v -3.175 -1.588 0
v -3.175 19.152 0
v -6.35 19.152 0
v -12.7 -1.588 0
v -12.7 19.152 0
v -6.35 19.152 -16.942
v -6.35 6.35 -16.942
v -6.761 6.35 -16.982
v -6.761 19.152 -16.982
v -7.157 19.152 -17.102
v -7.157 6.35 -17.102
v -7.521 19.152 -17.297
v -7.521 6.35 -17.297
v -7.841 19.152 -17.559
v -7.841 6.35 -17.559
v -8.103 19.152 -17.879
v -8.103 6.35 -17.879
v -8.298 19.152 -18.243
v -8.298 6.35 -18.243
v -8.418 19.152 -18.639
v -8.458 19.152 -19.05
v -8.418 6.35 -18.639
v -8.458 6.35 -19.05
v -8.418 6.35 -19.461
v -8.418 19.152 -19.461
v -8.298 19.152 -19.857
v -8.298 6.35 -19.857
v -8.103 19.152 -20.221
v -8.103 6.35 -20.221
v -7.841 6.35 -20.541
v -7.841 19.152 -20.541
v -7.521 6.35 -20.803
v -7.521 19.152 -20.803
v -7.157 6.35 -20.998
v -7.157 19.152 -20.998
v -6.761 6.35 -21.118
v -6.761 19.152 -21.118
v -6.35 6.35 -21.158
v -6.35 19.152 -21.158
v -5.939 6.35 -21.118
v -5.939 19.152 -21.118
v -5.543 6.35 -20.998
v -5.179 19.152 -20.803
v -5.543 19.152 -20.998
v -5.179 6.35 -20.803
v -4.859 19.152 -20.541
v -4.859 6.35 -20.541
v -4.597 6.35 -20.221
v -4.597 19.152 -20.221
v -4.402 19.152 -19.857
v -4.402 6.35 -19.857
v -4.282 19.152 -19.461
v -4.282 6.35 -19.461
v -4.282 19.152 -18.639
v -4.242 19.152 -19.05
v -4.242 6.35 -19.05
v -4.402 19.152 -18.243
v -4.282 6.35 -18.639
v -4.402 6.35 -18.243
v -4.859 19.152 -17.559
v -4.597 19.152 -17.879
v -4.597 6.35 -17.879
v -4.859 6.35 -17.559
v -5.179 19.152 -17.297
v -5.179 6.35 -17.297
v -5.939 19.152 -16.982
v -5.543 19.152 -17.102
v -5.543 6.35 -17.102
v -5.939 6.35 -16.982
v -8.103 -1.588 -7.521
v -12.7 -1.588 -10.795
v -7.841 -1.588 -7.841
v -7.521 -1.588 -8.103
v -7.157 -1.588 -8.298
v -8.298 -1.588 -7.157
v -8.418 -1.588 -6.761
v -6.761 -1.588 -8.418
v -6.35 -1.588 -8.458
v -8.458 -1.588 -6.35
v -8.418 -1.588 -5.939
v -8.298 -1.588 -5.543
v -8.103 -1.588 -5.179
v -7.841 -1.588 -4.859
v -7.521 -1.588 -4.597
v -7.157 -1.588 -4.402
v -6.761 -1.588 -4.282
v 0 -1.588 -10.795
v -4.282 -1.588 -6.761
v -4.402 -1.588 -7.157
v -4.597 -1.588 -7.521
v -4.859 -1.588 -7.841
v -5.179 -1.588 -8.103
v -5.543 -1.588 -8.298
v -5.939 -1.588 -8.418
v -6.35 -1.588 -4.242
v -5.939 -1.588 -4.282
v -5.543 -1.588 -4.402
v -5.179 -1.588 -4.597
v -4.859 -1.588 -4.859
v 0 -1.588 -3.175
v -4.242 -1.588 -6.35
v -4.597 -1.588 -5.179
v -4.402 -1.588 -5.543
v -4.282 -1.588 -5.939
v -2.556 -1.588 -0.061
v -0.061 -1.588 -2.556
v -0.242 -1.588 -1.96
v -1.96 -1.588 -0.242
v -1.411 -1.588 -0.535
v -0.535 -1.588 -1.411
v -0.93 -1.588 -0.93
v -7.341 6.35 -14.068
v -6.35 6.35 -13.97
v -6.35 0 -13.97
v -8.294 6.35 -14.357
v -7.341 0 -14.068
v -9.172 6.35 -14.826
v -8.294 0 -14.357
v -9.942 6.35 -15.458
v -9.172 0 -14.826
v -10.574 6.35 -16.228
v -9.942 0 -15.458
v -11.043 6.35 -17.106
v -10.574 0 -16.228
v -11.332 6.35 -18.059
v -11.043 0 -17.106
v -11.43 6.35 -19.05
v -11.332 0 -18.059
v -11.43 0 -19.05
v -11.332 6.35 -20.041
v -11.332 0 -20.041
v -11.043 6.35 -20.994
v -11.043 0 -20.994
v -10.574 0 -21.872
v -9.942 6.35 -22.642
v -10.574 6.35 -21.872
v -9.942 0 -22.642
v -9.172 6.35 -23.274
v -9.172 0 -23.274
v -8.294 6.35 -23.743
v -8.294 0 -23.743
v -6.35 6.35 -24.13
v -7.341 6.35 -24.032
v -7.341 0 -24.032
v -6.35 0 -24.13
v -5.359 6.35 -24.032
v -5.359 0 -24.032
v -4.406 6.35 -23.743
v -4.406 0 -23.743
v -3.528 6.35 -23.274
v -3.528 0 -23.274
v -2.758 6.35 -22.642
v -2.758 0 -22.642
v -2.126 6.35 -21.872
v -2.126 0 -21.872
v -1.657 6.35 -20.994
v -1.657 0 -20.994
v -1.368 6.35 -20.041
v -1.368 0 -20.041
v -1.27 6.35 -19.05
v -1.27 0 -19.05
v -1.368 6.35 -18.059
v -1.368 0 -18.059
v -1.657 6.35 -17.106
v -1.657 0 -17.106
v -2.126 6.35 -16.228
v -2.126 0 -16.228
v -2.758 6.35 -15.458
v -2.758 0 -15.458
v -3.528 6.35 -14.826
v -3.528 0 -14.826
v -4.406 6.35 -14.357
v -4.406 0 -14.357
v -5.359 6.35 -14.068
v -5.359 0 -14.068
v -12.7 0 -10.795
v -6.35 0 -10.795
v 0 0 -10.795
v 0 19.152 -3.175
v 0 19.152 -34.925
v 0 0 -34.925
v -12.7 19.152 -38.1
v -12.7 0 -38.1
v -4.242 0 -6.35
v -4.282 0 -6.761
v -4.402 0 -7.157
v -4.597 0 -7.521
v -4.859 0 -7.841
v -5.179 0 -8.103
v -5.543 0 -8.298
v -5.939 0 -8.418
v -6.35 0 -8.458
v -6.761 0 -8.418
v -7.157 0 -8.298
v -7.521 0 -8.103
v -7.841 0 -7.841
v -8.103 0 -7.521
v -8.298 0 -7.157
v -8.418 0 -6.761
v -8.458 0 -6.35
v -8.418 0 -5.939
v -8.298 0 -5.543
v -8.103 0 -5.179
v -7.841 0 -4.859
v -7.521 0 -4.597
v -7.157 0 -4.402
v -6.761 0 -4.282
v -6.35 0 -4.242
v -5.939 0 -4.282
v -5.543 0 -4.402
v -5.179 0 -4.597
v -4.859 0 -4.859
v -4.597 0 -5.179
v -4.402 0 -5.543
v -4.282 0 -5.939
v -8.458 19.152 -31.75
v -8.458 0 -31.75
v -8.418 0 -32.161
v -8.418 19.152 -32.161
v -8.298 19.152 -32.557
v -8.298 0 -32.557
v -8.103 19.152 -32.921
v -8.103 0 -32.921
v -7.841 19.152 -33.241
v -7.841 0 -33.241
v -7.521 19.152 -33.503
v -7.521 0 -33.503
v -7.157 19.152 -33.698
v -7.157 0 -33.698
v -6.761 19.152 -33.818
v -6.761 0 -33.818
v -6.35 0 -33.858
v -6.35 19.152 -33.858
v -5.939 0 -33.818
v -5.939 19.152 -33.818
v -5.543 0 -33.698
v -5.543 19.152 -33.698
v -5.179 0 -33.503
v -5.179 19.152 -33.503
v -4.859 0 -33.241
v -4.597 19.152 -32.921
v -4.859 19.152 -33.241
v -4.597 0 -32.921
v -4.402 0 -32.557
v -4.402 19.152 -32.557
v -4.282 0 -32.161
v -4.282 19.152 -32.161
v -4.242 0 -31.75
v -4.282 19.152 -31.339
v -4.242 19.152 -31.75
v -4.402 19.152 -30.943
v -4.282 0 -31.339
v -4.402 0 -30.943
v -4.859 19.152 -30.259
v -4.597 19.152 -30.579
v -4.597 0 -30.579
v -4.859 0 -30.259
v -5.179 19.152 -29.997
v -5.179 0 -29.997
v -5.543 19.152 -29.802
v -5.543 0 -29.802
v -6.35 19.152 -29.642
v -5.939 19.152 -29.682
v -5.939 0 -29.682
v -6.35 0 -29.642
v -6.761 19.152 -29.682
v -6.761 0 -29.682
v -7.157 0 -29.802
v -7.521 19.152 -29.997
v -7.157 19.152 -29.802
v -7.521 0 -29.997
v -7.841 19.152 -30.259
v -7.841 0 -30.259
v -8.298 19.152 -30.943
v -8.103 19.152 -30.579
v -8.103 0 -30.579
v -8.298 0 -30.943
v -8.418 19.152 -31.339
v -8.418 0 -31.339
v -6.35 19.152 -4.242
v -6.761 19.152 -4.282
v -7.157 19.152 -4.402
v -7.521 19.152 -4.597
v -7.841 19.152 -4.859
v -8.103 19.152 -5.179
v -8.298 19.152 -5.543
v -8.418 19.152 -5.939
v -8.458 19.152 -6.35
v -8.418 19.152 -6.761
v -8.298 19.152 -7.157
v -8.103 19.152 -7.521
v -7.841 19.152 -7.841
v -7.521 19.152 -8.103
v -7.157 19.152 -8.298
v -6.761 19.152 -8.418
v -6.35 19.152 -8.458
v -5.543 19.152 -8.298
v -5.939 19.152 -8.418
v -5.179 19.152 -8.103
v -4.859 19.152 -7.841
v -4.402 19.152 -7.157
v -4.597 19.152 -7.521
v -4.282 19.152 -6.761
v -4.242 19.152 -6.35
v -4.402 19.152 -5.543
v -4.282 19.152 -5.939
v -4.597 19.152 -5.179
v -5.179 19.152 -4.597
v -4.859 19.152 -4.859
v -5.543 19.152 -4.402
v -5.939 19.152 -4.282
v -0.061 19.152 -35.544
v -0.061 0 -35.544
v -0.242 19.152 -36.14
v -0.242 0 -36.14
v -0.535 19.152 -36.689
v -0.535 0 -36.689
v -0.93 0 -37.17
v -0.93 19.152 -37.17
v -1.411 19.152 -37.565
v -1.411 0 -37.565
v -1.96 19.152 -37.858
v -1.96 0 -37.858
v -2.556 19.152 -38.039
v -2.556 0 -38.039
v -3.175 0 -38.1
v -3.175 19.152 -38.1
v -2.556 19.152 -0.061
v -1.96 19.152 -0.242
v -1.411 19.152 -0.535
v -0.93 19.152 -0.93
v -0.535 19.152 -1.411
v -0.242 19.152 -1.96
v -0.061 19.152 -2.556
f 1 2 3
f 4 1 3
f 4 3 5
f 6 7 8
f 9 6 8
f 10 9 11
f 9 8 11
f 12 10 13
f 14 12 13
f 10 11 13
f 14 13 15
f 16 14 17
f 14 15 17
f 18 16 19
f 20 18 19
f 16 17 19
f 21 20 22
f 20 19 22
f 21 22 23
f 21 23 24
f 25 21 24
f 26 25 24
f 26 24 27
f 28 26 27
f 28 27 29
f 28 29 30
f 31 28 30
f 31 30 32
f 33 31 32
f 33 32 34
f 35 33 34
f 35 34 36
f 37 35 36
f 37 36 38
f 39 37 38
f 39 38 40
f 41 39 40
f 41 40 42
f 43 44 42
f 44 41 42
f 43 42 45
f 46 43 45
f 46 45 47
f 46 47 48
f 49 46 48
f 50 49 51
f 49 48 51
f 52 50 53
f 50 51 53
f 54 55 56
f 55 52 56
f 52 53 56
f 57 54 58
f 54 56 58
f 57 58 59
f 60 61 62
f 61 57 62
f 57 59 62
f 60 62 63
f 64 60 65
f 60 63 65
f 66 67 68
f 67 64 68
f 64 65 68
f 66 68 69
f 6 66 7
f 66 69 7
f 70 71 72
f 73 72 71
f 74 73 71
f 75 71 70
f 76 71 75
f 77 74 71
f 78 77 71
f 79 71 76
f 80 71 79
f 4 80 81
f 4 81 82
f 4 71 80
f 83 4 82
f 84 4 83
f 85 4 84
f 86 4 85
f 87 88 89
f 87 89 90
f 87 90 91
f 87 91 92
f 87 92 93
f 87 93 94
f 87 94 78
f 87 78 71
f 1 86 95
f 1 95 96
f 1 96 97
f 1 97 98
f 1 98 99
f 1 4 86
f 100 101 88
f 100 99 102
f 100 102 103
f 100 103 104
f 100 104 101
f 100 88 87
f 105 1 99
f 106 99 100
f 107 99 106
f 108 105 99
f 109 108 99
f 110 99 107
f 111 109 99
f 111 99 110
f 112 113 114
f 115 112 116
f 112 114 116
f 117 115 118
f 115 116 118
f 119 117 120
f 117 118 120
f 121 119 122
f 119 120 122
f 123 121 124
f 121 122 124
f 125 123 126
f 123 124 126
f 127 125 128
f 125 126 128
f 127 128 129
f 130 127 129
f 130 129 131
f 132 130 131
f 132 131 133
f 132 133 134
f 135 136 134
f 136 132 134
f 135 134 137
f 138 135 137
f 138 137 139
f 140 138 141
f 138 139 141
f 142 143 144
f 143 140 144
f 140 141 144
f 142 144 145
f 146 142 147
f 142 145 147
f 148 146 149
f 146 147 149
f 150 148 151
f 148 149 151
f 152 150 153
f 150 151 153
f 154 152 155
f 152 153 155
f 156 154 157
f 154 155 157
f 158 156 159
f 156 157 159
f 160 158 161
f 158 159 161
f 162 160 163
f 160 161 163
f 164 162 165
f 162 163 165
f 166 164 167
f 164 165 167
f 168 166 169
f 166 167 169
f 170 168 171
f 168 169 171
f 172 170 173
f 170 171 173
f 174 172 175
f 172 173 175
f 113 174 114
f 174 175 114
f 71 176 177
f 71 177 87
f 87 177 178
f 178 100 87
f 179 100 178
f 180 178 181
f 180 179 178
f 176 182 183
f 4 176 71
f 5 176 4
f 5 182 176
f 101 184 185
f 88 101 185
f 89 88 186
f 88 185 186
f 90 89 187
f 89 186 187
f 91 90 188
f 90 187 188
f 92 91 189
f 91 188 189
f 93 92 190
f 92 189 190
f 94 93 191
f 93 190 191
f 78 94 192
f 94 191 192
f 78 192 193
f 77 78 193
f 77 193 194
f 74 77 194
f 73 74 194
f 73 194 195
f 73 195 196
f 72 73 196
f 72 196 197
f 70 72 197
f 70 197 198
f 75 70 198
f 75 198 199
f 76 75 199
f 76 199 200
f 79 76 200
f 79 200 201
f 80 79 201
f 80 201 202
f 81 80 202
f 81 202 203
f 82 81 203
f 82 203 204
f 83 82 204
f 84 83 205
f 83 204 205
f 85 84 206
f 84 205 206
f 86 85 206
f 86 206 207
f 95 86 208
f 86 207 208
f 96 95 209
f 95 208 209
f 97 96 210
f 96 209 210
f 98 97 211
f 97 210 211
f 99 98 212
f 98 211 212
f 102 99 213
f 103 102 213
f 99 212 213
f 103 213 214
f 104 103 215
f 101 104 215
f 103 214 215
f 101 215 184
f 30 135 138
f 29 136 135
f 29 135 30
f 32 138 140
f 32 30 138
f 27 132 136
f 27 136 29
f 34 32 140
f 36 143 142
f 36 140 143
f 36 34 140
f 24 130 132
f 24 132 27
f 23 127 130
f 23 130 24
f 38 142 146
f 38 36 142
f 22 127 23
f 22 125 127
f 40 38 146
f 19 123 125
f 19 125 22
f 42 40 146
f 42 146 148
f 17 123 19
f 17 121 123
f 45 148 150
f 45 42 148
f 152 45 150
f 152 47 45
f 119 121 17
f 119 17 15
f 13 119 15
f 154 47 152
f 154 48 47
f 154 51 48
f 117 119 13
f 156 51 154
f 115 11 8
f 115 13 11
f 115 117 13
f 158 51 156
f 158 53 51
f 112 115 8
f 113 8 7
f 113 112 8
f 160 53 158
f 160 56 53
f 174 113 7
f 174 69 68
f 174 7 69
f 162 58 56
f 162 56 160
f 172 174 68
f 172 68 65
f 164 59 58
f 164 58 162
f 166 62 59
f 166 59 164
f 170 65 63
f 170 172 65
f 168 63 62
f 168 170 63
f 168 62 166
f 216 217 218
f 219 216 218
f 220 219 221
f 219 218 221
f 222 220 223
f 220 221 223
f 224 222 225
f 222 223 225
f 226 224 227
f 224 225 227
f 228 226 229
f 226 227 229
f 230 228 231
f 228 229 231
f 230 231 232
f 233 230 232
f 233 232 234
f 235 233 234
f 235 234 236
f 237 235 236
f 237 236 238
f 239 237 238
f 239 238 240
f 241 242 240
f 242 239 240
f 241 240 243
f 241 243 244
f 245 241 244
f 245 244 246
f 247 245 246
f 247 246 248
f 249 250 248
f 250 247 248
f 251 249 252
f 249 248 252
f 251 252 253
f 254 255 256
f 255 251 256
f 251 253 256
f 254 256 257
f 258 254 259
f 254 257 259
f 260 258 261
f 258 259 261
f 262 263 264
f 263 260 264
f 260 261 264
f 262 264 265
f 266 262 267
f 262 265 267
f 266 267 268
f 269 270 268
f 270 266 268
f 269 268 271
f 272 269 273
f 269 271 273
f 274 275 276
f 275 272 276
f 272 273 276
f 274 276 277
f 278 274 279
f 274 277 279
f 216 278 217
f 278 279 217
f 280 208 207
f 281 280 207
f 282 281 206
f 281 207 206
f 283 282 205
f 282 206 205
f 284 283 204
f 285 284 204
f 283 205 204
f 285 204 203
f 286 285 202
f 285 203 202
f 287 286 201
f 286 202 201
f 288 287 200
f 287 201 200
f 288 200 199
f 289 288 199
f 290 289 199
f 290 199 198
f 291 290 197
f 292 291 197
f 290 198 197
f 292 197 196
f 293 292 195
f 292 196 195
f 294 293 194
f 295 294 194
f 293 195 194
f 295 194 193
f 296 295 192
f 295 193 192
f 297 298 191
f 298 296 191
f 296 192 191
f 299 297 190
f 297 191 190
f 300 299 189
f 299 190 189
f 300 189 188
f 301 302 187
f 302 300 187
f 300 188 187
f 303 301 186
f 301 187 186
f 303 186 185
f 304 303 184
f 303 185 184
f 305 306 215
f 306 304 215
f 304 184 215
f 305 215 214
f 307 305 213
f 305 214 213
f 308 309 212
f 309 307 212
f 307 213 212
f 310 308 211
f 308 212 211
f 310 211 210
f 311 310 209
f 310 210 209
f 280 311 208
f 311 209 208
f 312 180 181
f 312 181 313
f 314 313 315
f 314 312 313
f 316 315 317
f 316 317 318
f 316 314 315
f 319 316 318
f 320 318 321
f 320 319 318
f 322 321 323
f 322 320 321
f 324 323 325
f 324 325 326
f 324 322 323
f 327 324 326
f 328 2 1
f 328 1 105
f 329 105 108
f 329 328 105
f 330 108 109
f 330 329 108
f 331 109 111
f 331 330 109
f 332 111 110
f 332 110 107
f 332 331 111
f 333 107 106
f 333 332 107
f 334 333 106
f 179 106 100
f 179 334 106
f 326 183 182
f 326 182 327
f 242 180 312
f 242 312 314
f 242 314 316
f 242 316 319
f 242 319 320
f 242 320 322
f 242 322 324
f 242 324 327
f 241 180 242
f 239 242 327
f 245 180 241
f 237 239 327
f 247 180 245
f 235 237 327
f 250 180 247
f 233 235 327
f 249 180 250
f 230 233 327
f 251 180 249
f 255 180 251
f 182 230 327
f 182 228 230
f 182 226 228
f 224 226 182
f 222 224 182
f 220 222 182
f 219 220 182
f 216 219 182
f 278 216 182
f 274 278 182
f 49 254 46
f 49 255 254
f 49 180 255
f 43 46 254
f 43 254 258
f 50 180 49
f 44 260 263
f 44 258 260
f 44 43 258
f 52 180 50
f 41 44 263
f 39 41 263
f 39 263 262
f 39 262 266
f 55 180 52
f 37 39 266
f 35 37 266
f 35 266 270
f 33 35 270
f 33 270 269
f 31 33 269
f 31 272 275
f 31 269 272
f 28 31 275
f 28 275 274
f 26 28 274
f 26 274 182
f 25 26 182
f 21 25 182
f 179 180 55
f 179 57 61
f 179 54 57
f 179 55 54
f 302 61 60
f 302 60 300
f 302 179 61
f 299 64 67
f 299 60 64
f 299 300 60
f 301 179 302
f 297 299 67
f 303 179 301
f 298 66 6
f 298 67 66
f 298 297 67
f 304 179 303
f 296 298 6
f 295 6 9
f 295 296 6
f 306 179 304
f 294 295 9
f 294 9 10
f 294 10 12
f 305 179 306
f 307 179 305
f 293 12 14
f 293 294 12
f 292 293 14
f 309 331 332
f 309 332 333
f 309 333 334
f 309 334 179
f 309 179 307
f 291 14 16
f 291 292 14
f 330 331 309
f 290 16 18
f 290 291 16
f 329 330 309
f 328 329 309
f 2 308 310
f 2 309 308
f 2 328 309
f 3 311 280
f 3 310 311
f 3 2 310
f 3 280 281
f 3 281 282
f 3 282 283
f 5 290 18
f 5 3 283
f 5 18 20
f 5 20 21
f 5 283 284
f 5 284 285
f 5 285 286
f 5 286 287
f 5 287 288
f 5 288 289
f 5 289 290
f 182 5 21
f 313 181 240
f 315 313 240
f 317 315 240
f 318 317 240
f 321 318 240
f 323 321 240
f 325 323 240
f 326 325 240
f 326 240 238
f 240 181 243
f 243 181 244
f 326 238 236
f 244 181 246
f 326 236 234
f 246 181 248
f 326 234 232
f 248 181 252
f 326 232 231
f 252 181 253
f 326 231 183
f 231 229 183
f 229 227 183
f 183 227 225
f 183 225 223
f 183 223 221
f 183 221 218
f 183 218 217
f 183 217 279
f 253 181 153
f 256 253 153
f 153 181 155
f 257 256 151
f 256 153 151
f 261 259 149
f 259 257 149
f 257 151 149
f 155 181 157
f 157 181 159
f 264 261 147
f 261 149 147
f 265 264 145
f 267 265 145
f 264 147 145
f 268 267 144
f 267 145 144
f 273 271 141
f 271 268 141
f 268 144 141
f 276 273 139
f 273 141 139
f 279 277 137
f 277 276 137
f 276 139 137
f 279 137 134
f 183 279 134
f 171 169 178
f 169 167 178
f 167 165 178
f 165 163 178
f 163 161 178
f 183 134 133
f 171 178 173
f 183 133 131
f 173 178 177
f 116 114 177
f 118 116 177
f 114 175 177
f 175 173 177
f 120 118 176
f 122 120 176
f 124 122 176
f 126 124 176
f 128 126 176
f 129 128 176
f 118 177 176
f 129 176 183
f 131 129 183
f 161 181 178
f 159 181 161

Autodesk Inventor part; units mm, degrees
ref_plane "YZ Plane" through (0, 0, 0) normal (1, 0, 0) x (0, 1, 0)
ref_plane "XZ Plane" through (0, 0, 0) normal (0, 1, 0) x (-1, 0, 0)
ref_plane "XY Plane" through (0, 0, 0) normal (0, 0, 1) x (1, 0, 0)
sketch "Sketch1" plane through (0, 0, 0) normal (0, 1, 0) x (-1, 0, 0)
  line L0 (0, 0) -> (12.7, 0)
  line L1 (12.7, 0) -> (12.7, -38.1)
  line L2 (12.7, -38.1) -> (0, -38.1)
  line L3 (0, -38.1) -> (0, 0)
  line L4 (6.35, 0) -> (6.35, -6.35)
  circle A0 centre (6.35, -6.35) radius 2.1082
  line L5 (6.35, -6.35) -> (6.35, -19.05)
  line L6 (6.35, -19.05) -> (6.35, -31.75)
  circle A1 centre (6.35, -19.05) radius 2.1082
  circle A2 centre (6.35, -31.75) radius 2.1082
  dimension "d0" = 12.7
  dimension "d1" = 38.1
  dimension "d2" = 6.35
  dimension "d3" = 4.2164
  dimension "d4" = 12.7
  dimension "d5" = 12.7
  dimension "d6" = 4.2164
  dimension "d7" = 4.2164
extrude "Extrusion1" add sketch "Sketch1" along normal blind 19.1516
sketch "Sketch2" plane through (0, 0, 0) normal (0, -1, 0) x (1, 0, 0)
  circle A0 centre (-6.35, -19.05) radius 2.1082 projected
  circle A1 centre (-6.35, -19.05) radius 5.08
  point P0 (0, 0)
  dimension "d11" = 10.16
extrude "Extrusion2" cut sketch "Sketch2" against normal blind 6.35
sketch "Sketch3" plane through (0, 0, 0) normal (0, -1, 0) x (1, 0, 0)
  line L0 (-12.7, -38.1) -> (-12.7, 0) projected
  line L1 (-12.7, 0) -> (-12.7, -10.795)
  line L2 (-12.7, -10.795) -> (0, -10.795)
  line L3 (0, 0) -> (0, -38.1) projected
  line L4 (0, 0) -> (-12.7, 0)
  point P0 (0, -3.175)
  dimension "d15" = 10.795
extrude "Extrusion3" add sketch "Sketch3" along normal blind 1.5875
fillet "Fillet3" radius 3.175 1 edges at (0, 8.782, 0)
sketch "Sketch4" plane through (-6.35, 0, -6.35) normal (0, 1, 0) x (1, 0, 0)
  circle A0 centre (0, 0) radius 2.1082
  point P0 (6.35, -6.35)
extrude "Extrusion4" cut sketch "Sketch4" against normal blind 3.175
fillet "Fillet4" radius 3.175 1 edges at (0, 9.5758, -38.1)
properties part number "inner wing mount"
